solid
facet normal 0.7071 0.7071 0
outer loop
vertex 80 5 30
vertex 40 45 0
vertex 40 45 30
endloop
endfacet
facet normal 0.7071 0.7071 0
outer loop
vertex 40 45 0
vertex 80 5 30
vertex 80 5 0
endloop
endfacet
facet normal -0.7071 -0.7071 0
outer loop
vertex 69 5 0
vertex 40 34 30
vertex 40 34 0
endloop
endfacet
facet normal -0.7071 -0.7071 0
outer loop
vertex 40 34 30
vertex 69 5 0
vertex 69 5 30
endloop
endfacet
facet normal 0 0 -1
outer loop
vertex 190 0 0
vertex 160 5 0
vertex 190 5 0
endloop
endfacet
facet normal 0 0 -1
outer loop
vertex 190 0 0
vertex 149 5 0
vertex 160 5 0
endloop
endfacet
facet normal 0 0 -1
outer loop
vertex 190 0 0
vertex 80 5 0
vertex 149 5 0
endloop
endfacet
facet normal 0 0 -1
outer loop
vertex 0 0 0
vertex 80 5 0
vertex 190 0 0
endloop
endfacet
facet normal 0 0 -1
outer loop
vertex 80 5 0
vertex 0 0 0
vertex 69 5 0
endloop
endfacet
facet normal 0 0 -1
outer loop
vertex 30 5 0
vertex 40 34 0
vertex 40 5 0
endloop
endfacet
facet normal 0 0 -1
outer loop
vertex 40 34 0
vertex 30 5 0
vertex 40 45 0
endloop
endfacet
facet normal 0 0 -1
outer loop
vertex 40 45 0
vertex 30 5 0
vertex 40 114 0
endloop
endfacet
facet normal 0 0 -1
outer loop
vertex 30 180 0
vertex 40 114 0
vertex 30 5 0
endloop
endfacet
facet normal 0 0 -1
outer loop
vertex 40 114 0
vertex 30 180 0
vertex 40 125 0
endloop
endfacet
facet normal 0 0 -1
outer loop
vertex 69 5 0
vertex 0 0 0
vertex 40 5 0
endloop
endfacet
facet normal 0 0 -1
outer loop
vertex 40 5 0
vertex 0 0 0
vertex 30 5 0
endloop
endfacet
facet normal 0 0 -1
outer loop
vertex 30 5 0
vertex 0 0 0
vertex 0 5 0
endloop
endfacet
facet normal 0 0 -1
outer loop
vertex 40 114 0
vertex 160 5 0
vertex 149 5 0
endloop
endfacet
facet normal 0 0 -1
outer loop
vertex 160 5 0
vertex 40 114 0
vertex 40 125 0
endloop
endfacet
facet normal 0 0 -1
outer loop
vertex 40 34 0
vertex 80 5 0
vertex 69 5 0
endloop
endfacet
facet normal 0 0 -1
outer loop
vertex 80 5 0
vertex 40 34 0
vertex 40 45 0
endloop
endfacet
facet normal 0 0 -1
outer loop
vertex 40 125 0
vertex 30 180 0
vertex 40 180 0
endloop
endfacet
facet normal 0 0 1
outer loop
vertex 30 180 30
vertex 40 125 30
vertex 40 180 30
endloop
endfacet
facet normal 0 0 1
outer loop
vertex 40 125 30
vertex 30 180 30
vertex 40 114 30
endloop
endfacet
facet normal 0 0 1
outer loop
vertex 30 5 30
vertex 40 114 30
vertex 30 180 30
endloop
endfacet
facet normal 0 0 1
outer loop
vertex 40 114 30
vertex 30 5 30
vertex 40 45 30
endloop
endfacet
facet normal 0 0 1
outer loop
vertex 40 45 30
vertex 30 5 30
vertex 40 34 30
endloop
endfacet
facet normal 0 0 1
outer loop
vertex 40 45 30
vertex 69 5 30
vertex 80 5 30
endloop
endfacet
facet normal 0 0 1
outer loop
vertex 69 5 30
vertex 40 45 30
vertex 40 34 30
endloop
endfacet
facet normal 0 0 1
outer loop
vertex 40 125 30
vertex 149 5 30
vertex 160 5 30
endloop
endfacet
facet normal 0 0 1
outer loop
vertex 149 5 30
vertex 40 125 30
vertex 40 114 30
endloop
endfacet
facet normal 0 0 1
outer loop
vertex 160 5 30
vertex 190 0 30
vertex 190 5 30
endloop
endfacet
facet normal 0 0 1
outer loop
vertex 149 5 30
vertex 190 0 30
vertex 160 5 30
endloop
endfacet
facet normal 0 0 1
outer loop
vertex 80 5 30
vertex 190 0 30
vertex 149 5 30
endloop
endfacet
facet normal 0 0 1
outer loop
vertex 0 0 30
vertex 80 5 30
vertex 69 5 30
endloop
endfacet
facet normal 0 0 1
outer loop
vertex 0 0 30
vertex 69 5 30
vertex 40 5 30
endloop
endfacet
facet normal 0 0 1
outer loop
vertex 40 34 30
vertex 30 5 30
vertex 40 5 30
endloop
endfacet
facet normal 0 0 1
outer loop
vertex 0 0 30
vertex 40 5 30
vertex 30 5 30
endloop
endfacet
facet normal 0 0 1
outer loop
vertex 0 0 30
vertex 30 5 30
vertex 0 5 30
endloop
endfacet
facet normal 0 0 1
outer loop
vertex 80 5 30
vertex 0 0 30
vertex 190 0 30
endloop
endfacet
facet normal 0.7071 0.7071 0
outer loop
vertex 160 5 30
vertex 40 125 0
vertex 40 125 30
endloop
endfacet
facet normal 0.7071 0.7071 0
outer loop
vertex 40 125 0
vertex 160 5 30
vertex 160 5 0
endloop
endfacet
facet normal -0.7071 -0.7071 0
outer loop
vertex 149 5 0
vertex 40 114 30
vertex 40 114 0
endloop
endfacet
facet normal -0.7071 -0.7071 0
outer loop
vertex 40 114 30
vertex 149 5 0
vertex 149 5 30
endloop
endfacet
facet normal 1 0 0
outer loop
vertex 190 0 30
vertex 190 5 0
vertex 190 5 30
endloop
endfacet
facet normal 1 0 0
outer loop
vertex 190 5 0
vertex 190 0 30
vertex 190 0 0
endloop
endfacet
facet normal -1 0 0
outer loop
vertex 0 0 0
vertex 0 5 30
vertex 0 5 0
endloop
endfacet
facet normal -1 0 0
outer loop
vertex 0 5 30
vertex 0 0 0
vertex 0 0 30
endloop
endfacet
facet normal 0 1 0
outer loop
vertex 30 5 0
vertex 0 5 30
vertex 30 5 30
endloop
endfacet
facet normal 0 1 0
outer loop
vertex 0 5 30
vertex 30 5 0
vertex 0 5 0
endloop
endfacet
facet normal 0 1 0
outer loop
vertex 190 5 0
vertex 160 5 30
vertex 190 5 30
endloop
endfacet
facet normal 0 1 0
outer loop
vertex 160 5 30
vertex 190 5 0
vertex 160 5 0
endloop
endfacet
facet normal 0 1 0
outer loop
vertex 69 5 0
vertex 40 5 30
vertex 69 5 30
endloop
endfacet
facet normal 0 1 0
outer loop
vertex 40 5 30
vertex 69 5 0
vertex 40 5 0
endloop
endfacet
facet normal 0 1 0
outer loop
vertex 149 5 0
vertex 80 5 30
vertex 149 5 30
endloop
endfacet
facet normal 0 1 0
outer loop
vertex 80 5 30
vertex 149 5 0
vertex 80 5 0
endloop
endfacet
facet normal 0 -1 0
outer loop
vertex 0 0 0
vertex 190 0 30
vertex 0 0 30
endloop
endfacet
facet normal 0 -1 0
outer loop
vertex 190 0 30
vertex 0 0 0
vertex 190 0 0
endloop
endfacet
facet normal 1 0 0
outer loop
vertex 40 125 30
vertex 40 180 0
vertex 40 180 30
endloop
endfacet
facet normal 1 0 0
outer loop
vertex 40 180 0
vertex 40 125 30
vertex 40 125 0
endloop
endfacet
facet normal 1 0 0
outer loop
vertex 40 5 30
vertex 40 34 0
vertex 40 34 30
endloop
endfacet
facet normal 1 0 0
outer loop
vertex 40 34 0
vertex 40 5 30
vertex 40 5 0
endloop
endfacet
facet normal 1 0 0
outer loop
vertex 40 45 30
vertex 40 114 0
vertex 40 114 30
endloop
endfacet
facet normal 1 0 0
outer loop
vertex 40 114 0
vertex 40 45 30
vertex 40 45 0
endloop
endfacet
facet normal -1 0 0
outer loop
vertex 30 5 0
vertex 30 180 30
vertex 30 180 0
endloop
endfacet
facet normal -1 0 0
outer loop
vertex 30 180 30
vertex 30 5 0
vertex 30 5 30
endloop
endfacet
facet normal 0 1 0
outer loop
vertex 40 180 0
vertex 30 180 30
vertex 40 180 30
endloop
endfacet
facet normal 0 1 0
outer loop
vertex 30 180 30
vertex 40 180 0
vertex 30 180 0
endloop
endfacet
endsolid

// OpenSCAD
$fn=200;

cube([190,5,30]);
translate([30,0,0])
{
    cube([10,180,30]);
}

color("red")
{
    hull()
    {
        translate([70,4,0])
        {
            cube([10,1,30]);
        }
        translate([39,35,0])
        {
            cube([1,10,30]);
        }
    }
    hull()
    {
        translate([150,4,0])
        {
            cube([10,1,30]);
        }
        translate([39,115,0])
        {
            cube([1,10,30]);
        }
    }
}
